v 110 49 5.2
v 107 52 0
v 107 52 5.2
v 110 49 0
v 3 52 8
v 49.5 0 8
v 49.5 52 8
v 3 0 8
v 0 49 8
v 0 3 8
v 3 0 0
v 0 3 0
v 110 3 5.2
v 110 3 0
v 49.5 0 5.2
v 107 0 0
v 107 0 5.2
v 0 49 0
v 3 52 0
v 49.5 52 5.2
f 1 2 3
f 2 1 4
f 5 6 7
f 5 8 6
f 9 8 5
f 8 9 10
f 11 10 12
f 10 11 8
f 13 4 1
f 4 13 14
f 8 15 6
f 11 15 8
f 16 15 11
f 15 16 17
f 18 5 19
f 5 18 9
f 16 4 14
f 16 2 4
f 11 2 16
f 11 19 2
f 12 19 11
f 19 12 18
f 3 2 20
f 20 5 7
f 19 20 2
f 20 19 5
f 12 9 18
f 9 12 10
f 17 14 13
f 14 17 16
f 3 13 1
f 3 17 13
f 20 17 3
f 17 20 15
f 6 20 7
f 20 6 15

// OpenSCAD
$fn = 32;

// ----------------------------------------------------------------------
// Stepped bar: endstep, 110 x 52 x 8/5.2 mm
// ----------------------------------------------------------------------

// --- parameters (mm) ---
bar_l = 110;              // bar length, X
bar_w = 52;               // bar width, Y
plate_t = 8;              // thickness of the thick zone, Z
thin_t = 5.2;             // thickness of the thin zone
corner_c = 3;             // corner chamfer of the bar
step_cut = 2.8;           // material removed from the thin zone
step_x = 49.5;            // step position from the left end
depth_1 = 2.8;            // depth of cut 1 from the top face
fit_tol = 0.05;           // declared fit tolerance (prompt contract)
free_tol = 0.3;           // declared free tolerance (prompt contract)

profile = [[3, 0], [107, 0], [110, 3], [110, 49], [107, 52], [3, 52], [0, 49], [0, 3]];  // primary outline, 8 points, counter clockwise
void_1 = [[49.5, -1], [111, -1], [111, 53], [49.5, 53]];  // thin zone beyond the step, 4 points

// --- the one profile operation ---
difference() {
  linear_extrude(height = plate_t) polygon(points = profile);
  translate([0, 0, plate_t - depth_1])
    linear_extrude(height = depth_1 + 1) polygon(points = void_1);
}
